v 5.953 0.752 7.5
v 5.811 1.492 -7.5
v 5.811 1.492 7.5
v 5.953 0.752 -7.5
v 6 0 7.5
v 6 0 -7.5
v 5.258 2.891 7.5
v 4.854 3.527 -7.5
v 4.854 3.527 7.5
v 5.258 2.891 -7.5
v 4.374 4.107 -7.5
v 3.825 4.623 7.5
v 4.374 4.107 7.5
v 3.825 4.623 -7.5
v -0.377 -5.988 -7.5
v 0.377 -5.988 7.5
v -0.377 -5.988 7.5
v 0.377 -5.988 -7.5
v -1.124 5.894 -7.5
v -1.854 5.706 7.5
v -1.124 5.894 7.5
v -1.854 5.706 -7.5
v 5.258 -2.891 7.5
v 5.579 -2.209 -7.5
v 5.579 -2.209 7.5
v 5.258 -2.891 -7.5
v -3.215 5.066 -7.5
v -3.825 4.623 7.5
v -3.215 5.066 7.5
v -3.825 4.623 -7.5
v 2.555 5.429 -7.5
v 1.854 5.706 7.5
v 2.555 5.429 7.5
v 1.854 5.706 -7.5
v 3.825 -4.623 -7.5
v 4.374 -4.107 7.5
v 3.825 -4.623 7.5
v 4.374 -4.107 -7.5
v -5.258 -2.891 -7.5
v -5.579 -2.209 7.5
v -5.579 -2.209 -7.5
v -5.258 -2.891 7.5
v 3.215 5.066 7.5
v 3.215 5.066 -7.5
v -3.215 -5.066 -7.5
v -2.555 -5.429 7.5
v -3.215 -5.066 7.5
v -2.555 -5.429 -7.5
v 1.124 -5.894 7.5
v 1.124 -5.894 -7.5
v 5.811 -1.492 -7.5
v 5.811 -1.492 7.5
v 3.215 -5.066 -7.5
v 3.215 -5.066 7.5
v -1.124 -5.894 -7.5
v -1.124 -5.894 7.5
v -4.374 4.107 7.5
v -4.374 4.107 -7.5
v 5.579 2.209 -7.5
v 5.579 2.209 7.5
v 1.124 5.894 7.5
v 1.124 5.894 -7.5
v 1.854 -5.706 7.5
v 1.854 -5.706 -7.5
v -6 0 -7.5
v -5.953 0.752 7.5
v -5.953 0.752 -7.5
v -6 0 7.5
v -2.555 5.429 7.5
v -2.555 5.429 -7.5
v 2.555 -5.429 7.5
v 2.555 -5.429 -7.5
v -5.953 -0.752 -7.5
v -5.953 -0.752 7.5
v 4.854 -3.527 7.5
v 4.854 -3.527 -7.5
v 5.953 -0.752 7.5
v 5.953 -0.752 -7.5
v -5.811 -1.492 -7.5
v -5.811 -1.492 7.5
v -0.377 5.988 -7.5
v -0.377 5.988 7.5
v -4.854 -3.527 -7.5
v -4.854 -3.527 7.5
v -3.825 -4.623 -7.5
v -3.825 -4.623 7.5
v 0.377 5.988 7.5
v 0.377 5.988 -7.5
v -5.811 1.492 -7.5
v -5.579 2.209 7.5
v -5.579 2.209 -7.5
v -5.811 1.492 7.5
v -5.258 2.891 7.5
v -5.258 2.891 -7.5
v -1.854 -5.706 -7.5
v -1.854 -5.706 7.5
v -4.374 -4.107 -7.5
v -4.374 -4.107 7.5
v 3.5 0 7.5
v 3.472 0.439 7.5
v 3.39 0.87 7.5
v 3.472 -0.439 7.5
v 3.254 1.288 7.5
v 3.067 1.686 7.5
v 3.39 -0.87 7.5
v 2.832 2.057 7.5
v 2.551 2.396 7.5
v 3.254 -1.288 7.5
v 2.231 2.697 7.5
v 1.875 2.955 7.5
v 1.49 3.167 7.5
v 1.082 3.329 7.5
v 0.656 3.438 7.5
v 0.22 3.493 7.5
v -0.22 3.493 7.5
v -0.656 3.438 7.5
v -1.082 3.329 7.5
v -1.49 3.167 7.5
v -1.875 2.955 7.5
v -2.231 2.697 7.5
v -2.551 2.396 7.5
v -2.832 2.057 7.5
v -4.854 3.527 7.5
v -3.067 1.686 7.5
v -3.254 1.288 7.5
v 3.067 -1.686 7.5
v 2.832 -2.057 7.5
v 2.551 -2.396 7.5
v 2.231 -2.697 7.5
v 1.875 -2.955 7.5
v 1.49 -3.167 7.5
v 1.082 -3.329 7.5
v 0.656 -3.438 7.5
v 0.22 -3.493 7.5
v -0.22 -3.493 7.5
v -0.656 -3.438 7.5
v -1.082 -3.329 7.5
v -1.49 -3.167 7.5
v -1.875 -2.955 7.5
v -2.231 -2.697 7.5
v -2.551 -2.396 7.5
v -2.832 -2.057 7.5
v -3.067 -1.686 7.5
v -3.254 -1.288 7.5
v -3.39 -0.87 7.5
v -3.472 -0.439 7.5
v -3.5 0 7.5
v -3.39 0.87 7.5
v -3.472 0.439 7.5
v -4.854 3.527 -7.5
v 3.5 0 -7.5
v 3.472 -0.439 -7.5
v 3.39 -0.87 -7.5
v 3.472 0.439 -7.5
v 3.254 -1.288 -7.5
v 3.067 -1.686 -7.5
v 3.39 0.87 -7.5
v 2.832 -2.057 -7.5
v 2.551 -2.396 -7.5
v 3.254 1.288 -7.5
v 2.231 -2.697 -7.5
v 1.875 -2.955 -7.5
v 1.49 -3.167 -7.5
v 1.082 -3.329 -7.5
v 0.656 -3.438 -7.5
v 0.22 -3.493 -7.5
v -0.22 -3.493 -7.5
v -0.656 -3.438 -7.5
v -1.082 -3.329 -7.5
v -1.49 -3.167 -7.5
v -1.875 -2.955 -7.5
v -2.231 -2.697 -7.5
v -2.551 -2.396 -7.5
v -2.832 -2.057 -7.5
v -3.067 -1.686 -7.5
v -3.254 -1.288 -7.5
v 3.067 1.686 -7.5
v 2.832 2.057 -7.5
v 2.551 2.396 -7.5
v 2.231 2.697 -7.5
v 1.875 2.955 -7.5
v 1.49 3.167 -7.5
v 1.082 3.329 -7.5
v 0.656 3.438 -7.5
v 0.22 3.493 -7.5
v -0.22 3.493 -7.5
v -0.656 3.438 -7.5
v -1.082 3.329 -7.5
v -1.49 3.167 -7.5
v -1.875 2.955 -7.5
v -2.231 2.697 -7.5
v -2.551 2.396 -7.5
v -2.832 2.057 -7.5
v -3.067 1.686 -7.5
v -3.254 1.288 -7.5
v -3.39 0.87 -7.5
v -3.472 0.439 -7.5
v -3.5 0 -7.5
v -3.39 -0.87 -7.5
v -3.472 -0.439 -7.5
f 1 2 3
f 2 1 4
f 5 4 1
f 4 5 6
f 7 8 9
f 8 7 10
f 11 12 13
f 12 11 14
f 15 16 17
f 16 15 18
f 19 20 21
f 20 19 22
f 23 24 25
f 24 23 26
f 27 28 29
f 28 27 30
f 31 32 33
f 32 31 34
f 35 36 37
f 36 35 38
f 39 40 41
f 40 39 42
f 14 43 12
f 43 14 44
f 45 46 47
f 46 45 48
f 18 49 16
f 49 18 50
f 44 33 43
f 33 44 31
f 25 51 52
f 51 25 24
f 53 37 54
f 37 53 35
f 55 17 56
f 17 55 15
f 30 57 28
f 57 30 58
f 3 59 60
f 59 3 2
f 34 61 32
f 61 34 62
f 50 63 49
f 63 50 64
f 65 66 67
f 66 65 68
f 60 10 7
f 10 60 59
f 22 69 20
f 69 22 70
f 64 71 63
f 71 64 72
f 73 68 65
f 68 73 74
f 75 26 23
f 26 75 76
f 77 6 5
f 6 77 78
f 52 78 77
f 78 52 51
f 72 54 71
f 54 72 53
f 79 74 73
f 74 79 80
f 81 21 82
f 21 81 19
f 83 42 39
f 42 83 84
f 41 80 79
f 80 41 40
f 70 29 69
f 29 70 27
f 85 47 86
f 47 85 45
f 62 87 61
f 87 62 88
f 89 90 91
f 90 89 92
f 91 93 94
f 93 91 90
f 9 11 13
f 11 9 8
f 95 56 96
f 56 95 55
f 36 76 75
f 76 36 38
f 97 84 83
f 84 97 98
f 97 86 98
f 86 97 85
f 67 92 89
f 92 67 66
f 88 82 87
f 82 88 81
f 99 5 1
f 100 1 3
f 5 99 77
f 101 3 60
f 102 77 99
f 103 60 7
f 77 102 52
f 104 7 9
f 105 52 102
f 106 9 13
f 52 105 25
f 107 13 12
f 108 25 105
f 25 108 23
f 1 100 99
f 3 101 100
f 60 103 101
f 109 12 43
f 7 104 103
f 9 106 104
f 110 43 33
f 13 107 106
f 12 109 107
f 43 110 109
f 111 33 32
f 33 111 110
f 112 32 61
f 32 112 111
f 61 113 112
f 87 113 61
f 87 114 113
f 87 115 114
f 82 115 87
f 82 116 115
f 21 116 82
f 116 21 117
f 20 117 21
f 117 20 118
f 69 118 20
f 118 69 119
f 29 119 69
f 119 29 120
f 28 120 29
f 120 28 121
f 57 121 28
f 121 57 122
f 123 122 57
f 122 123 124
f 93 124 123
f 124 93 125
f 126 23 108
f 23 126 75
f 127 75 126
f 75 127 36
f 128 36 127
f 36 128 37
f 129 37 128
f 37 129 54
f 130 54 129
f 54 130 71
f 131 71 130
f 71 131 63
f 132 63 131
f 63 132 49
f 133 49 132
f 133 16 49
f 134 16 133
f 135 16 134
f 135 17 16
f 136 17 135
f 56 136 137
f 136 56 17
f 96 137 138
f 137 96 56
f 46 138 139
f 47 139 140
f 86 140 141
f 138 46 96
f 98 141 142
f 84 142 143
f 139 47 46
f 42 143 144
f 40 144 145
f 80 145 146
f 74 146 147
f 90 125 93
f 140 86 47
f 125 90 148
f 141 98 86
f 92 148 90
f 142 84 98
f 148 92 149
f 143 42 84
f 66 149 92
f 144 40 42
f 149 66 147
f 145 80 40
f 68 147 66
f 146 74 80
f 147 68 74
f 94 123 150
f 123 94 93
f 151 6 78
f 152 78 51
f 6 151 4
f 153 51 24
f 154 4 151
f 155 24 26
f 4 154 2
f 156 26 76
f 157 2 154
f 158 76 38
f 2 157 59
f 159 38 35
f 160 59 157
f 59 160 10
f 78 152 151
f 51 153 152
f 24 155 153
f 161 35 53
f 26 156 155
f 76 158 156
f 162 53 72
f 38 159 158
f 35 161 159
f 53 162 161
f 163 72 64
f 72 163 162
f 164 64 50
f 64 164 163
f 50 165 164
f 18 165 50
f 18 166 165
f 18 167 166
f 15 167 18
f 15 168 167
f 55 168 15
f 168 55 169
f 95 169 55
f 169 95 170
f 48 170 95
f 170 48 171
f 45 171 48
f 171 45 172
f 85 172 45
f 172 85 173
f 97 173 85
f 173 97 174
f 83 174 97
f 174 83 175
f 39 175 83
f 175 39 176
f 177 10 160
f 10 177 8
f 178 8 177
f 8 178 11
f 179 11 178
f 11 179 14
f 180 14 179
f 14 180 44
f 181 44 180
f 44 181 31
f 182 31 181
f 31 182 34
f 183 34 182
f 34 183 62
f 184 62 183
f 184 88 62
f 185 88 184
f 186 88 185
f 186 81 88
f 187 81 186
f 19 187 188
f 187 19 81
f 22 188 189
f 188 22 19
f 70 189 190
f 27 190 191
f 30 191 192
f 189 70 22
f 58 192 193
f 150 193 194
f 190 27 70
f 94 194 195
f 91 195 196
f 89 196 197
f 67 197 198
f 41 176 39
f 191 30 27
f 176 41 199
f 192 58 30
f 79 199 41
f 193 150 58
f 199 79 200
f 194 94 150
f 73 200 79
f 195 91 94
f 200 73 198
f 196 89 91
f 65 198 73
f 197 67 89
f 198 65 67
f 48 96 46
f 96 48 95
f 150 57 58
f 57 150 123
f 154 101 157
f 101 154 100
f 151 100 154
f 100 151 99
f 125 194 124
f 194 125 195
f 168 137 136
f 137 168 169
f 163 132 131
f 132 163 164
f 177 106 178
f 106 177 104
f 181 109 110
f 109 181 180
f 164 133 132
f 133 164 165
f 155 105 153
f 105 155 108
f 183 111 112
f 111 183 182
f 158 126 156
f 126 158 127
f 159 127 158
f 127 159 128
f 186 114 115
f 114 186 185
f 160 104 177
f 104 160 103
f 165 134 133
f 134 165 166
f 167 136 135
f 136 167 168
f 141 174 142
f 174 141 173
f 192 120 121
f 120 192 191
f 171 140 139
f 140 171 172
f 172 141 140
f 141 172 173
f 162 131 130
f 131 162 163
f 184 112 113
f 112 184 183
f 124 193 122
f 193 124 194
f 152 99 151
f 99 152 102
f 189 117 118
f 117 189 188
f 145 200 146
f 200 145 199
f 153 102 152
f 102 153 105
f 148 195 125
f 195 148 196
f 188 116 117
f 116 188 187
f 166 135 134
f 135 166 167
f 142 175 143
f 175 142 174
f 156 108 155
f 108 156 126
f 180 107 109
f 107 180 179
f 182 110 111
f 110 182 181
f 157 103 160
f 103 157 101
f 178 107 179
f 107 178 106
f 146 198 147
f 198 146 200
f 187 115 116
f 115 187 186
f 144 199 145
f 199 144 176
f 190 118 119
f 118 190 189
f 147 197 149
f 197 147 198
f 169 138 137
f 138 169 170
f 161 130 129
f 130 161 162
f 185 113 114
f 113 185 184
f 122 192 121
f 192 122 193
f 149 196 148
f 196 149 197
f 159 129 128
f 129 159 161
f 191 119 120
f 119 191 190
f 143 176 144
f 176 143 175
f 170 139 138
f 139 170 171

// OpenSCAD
$fn = 50;


difference() {
	union() {
		translate(v = [0, 0, -7.5000000000]) {
			cylinder(h = 15, r = 6.0000000000);
		}
	}
	union() {
		translate(v = [0, 0, -100.0000000000]) {
			cylinder(h = 200, r = 3.5000000000);
		}
	}
}
